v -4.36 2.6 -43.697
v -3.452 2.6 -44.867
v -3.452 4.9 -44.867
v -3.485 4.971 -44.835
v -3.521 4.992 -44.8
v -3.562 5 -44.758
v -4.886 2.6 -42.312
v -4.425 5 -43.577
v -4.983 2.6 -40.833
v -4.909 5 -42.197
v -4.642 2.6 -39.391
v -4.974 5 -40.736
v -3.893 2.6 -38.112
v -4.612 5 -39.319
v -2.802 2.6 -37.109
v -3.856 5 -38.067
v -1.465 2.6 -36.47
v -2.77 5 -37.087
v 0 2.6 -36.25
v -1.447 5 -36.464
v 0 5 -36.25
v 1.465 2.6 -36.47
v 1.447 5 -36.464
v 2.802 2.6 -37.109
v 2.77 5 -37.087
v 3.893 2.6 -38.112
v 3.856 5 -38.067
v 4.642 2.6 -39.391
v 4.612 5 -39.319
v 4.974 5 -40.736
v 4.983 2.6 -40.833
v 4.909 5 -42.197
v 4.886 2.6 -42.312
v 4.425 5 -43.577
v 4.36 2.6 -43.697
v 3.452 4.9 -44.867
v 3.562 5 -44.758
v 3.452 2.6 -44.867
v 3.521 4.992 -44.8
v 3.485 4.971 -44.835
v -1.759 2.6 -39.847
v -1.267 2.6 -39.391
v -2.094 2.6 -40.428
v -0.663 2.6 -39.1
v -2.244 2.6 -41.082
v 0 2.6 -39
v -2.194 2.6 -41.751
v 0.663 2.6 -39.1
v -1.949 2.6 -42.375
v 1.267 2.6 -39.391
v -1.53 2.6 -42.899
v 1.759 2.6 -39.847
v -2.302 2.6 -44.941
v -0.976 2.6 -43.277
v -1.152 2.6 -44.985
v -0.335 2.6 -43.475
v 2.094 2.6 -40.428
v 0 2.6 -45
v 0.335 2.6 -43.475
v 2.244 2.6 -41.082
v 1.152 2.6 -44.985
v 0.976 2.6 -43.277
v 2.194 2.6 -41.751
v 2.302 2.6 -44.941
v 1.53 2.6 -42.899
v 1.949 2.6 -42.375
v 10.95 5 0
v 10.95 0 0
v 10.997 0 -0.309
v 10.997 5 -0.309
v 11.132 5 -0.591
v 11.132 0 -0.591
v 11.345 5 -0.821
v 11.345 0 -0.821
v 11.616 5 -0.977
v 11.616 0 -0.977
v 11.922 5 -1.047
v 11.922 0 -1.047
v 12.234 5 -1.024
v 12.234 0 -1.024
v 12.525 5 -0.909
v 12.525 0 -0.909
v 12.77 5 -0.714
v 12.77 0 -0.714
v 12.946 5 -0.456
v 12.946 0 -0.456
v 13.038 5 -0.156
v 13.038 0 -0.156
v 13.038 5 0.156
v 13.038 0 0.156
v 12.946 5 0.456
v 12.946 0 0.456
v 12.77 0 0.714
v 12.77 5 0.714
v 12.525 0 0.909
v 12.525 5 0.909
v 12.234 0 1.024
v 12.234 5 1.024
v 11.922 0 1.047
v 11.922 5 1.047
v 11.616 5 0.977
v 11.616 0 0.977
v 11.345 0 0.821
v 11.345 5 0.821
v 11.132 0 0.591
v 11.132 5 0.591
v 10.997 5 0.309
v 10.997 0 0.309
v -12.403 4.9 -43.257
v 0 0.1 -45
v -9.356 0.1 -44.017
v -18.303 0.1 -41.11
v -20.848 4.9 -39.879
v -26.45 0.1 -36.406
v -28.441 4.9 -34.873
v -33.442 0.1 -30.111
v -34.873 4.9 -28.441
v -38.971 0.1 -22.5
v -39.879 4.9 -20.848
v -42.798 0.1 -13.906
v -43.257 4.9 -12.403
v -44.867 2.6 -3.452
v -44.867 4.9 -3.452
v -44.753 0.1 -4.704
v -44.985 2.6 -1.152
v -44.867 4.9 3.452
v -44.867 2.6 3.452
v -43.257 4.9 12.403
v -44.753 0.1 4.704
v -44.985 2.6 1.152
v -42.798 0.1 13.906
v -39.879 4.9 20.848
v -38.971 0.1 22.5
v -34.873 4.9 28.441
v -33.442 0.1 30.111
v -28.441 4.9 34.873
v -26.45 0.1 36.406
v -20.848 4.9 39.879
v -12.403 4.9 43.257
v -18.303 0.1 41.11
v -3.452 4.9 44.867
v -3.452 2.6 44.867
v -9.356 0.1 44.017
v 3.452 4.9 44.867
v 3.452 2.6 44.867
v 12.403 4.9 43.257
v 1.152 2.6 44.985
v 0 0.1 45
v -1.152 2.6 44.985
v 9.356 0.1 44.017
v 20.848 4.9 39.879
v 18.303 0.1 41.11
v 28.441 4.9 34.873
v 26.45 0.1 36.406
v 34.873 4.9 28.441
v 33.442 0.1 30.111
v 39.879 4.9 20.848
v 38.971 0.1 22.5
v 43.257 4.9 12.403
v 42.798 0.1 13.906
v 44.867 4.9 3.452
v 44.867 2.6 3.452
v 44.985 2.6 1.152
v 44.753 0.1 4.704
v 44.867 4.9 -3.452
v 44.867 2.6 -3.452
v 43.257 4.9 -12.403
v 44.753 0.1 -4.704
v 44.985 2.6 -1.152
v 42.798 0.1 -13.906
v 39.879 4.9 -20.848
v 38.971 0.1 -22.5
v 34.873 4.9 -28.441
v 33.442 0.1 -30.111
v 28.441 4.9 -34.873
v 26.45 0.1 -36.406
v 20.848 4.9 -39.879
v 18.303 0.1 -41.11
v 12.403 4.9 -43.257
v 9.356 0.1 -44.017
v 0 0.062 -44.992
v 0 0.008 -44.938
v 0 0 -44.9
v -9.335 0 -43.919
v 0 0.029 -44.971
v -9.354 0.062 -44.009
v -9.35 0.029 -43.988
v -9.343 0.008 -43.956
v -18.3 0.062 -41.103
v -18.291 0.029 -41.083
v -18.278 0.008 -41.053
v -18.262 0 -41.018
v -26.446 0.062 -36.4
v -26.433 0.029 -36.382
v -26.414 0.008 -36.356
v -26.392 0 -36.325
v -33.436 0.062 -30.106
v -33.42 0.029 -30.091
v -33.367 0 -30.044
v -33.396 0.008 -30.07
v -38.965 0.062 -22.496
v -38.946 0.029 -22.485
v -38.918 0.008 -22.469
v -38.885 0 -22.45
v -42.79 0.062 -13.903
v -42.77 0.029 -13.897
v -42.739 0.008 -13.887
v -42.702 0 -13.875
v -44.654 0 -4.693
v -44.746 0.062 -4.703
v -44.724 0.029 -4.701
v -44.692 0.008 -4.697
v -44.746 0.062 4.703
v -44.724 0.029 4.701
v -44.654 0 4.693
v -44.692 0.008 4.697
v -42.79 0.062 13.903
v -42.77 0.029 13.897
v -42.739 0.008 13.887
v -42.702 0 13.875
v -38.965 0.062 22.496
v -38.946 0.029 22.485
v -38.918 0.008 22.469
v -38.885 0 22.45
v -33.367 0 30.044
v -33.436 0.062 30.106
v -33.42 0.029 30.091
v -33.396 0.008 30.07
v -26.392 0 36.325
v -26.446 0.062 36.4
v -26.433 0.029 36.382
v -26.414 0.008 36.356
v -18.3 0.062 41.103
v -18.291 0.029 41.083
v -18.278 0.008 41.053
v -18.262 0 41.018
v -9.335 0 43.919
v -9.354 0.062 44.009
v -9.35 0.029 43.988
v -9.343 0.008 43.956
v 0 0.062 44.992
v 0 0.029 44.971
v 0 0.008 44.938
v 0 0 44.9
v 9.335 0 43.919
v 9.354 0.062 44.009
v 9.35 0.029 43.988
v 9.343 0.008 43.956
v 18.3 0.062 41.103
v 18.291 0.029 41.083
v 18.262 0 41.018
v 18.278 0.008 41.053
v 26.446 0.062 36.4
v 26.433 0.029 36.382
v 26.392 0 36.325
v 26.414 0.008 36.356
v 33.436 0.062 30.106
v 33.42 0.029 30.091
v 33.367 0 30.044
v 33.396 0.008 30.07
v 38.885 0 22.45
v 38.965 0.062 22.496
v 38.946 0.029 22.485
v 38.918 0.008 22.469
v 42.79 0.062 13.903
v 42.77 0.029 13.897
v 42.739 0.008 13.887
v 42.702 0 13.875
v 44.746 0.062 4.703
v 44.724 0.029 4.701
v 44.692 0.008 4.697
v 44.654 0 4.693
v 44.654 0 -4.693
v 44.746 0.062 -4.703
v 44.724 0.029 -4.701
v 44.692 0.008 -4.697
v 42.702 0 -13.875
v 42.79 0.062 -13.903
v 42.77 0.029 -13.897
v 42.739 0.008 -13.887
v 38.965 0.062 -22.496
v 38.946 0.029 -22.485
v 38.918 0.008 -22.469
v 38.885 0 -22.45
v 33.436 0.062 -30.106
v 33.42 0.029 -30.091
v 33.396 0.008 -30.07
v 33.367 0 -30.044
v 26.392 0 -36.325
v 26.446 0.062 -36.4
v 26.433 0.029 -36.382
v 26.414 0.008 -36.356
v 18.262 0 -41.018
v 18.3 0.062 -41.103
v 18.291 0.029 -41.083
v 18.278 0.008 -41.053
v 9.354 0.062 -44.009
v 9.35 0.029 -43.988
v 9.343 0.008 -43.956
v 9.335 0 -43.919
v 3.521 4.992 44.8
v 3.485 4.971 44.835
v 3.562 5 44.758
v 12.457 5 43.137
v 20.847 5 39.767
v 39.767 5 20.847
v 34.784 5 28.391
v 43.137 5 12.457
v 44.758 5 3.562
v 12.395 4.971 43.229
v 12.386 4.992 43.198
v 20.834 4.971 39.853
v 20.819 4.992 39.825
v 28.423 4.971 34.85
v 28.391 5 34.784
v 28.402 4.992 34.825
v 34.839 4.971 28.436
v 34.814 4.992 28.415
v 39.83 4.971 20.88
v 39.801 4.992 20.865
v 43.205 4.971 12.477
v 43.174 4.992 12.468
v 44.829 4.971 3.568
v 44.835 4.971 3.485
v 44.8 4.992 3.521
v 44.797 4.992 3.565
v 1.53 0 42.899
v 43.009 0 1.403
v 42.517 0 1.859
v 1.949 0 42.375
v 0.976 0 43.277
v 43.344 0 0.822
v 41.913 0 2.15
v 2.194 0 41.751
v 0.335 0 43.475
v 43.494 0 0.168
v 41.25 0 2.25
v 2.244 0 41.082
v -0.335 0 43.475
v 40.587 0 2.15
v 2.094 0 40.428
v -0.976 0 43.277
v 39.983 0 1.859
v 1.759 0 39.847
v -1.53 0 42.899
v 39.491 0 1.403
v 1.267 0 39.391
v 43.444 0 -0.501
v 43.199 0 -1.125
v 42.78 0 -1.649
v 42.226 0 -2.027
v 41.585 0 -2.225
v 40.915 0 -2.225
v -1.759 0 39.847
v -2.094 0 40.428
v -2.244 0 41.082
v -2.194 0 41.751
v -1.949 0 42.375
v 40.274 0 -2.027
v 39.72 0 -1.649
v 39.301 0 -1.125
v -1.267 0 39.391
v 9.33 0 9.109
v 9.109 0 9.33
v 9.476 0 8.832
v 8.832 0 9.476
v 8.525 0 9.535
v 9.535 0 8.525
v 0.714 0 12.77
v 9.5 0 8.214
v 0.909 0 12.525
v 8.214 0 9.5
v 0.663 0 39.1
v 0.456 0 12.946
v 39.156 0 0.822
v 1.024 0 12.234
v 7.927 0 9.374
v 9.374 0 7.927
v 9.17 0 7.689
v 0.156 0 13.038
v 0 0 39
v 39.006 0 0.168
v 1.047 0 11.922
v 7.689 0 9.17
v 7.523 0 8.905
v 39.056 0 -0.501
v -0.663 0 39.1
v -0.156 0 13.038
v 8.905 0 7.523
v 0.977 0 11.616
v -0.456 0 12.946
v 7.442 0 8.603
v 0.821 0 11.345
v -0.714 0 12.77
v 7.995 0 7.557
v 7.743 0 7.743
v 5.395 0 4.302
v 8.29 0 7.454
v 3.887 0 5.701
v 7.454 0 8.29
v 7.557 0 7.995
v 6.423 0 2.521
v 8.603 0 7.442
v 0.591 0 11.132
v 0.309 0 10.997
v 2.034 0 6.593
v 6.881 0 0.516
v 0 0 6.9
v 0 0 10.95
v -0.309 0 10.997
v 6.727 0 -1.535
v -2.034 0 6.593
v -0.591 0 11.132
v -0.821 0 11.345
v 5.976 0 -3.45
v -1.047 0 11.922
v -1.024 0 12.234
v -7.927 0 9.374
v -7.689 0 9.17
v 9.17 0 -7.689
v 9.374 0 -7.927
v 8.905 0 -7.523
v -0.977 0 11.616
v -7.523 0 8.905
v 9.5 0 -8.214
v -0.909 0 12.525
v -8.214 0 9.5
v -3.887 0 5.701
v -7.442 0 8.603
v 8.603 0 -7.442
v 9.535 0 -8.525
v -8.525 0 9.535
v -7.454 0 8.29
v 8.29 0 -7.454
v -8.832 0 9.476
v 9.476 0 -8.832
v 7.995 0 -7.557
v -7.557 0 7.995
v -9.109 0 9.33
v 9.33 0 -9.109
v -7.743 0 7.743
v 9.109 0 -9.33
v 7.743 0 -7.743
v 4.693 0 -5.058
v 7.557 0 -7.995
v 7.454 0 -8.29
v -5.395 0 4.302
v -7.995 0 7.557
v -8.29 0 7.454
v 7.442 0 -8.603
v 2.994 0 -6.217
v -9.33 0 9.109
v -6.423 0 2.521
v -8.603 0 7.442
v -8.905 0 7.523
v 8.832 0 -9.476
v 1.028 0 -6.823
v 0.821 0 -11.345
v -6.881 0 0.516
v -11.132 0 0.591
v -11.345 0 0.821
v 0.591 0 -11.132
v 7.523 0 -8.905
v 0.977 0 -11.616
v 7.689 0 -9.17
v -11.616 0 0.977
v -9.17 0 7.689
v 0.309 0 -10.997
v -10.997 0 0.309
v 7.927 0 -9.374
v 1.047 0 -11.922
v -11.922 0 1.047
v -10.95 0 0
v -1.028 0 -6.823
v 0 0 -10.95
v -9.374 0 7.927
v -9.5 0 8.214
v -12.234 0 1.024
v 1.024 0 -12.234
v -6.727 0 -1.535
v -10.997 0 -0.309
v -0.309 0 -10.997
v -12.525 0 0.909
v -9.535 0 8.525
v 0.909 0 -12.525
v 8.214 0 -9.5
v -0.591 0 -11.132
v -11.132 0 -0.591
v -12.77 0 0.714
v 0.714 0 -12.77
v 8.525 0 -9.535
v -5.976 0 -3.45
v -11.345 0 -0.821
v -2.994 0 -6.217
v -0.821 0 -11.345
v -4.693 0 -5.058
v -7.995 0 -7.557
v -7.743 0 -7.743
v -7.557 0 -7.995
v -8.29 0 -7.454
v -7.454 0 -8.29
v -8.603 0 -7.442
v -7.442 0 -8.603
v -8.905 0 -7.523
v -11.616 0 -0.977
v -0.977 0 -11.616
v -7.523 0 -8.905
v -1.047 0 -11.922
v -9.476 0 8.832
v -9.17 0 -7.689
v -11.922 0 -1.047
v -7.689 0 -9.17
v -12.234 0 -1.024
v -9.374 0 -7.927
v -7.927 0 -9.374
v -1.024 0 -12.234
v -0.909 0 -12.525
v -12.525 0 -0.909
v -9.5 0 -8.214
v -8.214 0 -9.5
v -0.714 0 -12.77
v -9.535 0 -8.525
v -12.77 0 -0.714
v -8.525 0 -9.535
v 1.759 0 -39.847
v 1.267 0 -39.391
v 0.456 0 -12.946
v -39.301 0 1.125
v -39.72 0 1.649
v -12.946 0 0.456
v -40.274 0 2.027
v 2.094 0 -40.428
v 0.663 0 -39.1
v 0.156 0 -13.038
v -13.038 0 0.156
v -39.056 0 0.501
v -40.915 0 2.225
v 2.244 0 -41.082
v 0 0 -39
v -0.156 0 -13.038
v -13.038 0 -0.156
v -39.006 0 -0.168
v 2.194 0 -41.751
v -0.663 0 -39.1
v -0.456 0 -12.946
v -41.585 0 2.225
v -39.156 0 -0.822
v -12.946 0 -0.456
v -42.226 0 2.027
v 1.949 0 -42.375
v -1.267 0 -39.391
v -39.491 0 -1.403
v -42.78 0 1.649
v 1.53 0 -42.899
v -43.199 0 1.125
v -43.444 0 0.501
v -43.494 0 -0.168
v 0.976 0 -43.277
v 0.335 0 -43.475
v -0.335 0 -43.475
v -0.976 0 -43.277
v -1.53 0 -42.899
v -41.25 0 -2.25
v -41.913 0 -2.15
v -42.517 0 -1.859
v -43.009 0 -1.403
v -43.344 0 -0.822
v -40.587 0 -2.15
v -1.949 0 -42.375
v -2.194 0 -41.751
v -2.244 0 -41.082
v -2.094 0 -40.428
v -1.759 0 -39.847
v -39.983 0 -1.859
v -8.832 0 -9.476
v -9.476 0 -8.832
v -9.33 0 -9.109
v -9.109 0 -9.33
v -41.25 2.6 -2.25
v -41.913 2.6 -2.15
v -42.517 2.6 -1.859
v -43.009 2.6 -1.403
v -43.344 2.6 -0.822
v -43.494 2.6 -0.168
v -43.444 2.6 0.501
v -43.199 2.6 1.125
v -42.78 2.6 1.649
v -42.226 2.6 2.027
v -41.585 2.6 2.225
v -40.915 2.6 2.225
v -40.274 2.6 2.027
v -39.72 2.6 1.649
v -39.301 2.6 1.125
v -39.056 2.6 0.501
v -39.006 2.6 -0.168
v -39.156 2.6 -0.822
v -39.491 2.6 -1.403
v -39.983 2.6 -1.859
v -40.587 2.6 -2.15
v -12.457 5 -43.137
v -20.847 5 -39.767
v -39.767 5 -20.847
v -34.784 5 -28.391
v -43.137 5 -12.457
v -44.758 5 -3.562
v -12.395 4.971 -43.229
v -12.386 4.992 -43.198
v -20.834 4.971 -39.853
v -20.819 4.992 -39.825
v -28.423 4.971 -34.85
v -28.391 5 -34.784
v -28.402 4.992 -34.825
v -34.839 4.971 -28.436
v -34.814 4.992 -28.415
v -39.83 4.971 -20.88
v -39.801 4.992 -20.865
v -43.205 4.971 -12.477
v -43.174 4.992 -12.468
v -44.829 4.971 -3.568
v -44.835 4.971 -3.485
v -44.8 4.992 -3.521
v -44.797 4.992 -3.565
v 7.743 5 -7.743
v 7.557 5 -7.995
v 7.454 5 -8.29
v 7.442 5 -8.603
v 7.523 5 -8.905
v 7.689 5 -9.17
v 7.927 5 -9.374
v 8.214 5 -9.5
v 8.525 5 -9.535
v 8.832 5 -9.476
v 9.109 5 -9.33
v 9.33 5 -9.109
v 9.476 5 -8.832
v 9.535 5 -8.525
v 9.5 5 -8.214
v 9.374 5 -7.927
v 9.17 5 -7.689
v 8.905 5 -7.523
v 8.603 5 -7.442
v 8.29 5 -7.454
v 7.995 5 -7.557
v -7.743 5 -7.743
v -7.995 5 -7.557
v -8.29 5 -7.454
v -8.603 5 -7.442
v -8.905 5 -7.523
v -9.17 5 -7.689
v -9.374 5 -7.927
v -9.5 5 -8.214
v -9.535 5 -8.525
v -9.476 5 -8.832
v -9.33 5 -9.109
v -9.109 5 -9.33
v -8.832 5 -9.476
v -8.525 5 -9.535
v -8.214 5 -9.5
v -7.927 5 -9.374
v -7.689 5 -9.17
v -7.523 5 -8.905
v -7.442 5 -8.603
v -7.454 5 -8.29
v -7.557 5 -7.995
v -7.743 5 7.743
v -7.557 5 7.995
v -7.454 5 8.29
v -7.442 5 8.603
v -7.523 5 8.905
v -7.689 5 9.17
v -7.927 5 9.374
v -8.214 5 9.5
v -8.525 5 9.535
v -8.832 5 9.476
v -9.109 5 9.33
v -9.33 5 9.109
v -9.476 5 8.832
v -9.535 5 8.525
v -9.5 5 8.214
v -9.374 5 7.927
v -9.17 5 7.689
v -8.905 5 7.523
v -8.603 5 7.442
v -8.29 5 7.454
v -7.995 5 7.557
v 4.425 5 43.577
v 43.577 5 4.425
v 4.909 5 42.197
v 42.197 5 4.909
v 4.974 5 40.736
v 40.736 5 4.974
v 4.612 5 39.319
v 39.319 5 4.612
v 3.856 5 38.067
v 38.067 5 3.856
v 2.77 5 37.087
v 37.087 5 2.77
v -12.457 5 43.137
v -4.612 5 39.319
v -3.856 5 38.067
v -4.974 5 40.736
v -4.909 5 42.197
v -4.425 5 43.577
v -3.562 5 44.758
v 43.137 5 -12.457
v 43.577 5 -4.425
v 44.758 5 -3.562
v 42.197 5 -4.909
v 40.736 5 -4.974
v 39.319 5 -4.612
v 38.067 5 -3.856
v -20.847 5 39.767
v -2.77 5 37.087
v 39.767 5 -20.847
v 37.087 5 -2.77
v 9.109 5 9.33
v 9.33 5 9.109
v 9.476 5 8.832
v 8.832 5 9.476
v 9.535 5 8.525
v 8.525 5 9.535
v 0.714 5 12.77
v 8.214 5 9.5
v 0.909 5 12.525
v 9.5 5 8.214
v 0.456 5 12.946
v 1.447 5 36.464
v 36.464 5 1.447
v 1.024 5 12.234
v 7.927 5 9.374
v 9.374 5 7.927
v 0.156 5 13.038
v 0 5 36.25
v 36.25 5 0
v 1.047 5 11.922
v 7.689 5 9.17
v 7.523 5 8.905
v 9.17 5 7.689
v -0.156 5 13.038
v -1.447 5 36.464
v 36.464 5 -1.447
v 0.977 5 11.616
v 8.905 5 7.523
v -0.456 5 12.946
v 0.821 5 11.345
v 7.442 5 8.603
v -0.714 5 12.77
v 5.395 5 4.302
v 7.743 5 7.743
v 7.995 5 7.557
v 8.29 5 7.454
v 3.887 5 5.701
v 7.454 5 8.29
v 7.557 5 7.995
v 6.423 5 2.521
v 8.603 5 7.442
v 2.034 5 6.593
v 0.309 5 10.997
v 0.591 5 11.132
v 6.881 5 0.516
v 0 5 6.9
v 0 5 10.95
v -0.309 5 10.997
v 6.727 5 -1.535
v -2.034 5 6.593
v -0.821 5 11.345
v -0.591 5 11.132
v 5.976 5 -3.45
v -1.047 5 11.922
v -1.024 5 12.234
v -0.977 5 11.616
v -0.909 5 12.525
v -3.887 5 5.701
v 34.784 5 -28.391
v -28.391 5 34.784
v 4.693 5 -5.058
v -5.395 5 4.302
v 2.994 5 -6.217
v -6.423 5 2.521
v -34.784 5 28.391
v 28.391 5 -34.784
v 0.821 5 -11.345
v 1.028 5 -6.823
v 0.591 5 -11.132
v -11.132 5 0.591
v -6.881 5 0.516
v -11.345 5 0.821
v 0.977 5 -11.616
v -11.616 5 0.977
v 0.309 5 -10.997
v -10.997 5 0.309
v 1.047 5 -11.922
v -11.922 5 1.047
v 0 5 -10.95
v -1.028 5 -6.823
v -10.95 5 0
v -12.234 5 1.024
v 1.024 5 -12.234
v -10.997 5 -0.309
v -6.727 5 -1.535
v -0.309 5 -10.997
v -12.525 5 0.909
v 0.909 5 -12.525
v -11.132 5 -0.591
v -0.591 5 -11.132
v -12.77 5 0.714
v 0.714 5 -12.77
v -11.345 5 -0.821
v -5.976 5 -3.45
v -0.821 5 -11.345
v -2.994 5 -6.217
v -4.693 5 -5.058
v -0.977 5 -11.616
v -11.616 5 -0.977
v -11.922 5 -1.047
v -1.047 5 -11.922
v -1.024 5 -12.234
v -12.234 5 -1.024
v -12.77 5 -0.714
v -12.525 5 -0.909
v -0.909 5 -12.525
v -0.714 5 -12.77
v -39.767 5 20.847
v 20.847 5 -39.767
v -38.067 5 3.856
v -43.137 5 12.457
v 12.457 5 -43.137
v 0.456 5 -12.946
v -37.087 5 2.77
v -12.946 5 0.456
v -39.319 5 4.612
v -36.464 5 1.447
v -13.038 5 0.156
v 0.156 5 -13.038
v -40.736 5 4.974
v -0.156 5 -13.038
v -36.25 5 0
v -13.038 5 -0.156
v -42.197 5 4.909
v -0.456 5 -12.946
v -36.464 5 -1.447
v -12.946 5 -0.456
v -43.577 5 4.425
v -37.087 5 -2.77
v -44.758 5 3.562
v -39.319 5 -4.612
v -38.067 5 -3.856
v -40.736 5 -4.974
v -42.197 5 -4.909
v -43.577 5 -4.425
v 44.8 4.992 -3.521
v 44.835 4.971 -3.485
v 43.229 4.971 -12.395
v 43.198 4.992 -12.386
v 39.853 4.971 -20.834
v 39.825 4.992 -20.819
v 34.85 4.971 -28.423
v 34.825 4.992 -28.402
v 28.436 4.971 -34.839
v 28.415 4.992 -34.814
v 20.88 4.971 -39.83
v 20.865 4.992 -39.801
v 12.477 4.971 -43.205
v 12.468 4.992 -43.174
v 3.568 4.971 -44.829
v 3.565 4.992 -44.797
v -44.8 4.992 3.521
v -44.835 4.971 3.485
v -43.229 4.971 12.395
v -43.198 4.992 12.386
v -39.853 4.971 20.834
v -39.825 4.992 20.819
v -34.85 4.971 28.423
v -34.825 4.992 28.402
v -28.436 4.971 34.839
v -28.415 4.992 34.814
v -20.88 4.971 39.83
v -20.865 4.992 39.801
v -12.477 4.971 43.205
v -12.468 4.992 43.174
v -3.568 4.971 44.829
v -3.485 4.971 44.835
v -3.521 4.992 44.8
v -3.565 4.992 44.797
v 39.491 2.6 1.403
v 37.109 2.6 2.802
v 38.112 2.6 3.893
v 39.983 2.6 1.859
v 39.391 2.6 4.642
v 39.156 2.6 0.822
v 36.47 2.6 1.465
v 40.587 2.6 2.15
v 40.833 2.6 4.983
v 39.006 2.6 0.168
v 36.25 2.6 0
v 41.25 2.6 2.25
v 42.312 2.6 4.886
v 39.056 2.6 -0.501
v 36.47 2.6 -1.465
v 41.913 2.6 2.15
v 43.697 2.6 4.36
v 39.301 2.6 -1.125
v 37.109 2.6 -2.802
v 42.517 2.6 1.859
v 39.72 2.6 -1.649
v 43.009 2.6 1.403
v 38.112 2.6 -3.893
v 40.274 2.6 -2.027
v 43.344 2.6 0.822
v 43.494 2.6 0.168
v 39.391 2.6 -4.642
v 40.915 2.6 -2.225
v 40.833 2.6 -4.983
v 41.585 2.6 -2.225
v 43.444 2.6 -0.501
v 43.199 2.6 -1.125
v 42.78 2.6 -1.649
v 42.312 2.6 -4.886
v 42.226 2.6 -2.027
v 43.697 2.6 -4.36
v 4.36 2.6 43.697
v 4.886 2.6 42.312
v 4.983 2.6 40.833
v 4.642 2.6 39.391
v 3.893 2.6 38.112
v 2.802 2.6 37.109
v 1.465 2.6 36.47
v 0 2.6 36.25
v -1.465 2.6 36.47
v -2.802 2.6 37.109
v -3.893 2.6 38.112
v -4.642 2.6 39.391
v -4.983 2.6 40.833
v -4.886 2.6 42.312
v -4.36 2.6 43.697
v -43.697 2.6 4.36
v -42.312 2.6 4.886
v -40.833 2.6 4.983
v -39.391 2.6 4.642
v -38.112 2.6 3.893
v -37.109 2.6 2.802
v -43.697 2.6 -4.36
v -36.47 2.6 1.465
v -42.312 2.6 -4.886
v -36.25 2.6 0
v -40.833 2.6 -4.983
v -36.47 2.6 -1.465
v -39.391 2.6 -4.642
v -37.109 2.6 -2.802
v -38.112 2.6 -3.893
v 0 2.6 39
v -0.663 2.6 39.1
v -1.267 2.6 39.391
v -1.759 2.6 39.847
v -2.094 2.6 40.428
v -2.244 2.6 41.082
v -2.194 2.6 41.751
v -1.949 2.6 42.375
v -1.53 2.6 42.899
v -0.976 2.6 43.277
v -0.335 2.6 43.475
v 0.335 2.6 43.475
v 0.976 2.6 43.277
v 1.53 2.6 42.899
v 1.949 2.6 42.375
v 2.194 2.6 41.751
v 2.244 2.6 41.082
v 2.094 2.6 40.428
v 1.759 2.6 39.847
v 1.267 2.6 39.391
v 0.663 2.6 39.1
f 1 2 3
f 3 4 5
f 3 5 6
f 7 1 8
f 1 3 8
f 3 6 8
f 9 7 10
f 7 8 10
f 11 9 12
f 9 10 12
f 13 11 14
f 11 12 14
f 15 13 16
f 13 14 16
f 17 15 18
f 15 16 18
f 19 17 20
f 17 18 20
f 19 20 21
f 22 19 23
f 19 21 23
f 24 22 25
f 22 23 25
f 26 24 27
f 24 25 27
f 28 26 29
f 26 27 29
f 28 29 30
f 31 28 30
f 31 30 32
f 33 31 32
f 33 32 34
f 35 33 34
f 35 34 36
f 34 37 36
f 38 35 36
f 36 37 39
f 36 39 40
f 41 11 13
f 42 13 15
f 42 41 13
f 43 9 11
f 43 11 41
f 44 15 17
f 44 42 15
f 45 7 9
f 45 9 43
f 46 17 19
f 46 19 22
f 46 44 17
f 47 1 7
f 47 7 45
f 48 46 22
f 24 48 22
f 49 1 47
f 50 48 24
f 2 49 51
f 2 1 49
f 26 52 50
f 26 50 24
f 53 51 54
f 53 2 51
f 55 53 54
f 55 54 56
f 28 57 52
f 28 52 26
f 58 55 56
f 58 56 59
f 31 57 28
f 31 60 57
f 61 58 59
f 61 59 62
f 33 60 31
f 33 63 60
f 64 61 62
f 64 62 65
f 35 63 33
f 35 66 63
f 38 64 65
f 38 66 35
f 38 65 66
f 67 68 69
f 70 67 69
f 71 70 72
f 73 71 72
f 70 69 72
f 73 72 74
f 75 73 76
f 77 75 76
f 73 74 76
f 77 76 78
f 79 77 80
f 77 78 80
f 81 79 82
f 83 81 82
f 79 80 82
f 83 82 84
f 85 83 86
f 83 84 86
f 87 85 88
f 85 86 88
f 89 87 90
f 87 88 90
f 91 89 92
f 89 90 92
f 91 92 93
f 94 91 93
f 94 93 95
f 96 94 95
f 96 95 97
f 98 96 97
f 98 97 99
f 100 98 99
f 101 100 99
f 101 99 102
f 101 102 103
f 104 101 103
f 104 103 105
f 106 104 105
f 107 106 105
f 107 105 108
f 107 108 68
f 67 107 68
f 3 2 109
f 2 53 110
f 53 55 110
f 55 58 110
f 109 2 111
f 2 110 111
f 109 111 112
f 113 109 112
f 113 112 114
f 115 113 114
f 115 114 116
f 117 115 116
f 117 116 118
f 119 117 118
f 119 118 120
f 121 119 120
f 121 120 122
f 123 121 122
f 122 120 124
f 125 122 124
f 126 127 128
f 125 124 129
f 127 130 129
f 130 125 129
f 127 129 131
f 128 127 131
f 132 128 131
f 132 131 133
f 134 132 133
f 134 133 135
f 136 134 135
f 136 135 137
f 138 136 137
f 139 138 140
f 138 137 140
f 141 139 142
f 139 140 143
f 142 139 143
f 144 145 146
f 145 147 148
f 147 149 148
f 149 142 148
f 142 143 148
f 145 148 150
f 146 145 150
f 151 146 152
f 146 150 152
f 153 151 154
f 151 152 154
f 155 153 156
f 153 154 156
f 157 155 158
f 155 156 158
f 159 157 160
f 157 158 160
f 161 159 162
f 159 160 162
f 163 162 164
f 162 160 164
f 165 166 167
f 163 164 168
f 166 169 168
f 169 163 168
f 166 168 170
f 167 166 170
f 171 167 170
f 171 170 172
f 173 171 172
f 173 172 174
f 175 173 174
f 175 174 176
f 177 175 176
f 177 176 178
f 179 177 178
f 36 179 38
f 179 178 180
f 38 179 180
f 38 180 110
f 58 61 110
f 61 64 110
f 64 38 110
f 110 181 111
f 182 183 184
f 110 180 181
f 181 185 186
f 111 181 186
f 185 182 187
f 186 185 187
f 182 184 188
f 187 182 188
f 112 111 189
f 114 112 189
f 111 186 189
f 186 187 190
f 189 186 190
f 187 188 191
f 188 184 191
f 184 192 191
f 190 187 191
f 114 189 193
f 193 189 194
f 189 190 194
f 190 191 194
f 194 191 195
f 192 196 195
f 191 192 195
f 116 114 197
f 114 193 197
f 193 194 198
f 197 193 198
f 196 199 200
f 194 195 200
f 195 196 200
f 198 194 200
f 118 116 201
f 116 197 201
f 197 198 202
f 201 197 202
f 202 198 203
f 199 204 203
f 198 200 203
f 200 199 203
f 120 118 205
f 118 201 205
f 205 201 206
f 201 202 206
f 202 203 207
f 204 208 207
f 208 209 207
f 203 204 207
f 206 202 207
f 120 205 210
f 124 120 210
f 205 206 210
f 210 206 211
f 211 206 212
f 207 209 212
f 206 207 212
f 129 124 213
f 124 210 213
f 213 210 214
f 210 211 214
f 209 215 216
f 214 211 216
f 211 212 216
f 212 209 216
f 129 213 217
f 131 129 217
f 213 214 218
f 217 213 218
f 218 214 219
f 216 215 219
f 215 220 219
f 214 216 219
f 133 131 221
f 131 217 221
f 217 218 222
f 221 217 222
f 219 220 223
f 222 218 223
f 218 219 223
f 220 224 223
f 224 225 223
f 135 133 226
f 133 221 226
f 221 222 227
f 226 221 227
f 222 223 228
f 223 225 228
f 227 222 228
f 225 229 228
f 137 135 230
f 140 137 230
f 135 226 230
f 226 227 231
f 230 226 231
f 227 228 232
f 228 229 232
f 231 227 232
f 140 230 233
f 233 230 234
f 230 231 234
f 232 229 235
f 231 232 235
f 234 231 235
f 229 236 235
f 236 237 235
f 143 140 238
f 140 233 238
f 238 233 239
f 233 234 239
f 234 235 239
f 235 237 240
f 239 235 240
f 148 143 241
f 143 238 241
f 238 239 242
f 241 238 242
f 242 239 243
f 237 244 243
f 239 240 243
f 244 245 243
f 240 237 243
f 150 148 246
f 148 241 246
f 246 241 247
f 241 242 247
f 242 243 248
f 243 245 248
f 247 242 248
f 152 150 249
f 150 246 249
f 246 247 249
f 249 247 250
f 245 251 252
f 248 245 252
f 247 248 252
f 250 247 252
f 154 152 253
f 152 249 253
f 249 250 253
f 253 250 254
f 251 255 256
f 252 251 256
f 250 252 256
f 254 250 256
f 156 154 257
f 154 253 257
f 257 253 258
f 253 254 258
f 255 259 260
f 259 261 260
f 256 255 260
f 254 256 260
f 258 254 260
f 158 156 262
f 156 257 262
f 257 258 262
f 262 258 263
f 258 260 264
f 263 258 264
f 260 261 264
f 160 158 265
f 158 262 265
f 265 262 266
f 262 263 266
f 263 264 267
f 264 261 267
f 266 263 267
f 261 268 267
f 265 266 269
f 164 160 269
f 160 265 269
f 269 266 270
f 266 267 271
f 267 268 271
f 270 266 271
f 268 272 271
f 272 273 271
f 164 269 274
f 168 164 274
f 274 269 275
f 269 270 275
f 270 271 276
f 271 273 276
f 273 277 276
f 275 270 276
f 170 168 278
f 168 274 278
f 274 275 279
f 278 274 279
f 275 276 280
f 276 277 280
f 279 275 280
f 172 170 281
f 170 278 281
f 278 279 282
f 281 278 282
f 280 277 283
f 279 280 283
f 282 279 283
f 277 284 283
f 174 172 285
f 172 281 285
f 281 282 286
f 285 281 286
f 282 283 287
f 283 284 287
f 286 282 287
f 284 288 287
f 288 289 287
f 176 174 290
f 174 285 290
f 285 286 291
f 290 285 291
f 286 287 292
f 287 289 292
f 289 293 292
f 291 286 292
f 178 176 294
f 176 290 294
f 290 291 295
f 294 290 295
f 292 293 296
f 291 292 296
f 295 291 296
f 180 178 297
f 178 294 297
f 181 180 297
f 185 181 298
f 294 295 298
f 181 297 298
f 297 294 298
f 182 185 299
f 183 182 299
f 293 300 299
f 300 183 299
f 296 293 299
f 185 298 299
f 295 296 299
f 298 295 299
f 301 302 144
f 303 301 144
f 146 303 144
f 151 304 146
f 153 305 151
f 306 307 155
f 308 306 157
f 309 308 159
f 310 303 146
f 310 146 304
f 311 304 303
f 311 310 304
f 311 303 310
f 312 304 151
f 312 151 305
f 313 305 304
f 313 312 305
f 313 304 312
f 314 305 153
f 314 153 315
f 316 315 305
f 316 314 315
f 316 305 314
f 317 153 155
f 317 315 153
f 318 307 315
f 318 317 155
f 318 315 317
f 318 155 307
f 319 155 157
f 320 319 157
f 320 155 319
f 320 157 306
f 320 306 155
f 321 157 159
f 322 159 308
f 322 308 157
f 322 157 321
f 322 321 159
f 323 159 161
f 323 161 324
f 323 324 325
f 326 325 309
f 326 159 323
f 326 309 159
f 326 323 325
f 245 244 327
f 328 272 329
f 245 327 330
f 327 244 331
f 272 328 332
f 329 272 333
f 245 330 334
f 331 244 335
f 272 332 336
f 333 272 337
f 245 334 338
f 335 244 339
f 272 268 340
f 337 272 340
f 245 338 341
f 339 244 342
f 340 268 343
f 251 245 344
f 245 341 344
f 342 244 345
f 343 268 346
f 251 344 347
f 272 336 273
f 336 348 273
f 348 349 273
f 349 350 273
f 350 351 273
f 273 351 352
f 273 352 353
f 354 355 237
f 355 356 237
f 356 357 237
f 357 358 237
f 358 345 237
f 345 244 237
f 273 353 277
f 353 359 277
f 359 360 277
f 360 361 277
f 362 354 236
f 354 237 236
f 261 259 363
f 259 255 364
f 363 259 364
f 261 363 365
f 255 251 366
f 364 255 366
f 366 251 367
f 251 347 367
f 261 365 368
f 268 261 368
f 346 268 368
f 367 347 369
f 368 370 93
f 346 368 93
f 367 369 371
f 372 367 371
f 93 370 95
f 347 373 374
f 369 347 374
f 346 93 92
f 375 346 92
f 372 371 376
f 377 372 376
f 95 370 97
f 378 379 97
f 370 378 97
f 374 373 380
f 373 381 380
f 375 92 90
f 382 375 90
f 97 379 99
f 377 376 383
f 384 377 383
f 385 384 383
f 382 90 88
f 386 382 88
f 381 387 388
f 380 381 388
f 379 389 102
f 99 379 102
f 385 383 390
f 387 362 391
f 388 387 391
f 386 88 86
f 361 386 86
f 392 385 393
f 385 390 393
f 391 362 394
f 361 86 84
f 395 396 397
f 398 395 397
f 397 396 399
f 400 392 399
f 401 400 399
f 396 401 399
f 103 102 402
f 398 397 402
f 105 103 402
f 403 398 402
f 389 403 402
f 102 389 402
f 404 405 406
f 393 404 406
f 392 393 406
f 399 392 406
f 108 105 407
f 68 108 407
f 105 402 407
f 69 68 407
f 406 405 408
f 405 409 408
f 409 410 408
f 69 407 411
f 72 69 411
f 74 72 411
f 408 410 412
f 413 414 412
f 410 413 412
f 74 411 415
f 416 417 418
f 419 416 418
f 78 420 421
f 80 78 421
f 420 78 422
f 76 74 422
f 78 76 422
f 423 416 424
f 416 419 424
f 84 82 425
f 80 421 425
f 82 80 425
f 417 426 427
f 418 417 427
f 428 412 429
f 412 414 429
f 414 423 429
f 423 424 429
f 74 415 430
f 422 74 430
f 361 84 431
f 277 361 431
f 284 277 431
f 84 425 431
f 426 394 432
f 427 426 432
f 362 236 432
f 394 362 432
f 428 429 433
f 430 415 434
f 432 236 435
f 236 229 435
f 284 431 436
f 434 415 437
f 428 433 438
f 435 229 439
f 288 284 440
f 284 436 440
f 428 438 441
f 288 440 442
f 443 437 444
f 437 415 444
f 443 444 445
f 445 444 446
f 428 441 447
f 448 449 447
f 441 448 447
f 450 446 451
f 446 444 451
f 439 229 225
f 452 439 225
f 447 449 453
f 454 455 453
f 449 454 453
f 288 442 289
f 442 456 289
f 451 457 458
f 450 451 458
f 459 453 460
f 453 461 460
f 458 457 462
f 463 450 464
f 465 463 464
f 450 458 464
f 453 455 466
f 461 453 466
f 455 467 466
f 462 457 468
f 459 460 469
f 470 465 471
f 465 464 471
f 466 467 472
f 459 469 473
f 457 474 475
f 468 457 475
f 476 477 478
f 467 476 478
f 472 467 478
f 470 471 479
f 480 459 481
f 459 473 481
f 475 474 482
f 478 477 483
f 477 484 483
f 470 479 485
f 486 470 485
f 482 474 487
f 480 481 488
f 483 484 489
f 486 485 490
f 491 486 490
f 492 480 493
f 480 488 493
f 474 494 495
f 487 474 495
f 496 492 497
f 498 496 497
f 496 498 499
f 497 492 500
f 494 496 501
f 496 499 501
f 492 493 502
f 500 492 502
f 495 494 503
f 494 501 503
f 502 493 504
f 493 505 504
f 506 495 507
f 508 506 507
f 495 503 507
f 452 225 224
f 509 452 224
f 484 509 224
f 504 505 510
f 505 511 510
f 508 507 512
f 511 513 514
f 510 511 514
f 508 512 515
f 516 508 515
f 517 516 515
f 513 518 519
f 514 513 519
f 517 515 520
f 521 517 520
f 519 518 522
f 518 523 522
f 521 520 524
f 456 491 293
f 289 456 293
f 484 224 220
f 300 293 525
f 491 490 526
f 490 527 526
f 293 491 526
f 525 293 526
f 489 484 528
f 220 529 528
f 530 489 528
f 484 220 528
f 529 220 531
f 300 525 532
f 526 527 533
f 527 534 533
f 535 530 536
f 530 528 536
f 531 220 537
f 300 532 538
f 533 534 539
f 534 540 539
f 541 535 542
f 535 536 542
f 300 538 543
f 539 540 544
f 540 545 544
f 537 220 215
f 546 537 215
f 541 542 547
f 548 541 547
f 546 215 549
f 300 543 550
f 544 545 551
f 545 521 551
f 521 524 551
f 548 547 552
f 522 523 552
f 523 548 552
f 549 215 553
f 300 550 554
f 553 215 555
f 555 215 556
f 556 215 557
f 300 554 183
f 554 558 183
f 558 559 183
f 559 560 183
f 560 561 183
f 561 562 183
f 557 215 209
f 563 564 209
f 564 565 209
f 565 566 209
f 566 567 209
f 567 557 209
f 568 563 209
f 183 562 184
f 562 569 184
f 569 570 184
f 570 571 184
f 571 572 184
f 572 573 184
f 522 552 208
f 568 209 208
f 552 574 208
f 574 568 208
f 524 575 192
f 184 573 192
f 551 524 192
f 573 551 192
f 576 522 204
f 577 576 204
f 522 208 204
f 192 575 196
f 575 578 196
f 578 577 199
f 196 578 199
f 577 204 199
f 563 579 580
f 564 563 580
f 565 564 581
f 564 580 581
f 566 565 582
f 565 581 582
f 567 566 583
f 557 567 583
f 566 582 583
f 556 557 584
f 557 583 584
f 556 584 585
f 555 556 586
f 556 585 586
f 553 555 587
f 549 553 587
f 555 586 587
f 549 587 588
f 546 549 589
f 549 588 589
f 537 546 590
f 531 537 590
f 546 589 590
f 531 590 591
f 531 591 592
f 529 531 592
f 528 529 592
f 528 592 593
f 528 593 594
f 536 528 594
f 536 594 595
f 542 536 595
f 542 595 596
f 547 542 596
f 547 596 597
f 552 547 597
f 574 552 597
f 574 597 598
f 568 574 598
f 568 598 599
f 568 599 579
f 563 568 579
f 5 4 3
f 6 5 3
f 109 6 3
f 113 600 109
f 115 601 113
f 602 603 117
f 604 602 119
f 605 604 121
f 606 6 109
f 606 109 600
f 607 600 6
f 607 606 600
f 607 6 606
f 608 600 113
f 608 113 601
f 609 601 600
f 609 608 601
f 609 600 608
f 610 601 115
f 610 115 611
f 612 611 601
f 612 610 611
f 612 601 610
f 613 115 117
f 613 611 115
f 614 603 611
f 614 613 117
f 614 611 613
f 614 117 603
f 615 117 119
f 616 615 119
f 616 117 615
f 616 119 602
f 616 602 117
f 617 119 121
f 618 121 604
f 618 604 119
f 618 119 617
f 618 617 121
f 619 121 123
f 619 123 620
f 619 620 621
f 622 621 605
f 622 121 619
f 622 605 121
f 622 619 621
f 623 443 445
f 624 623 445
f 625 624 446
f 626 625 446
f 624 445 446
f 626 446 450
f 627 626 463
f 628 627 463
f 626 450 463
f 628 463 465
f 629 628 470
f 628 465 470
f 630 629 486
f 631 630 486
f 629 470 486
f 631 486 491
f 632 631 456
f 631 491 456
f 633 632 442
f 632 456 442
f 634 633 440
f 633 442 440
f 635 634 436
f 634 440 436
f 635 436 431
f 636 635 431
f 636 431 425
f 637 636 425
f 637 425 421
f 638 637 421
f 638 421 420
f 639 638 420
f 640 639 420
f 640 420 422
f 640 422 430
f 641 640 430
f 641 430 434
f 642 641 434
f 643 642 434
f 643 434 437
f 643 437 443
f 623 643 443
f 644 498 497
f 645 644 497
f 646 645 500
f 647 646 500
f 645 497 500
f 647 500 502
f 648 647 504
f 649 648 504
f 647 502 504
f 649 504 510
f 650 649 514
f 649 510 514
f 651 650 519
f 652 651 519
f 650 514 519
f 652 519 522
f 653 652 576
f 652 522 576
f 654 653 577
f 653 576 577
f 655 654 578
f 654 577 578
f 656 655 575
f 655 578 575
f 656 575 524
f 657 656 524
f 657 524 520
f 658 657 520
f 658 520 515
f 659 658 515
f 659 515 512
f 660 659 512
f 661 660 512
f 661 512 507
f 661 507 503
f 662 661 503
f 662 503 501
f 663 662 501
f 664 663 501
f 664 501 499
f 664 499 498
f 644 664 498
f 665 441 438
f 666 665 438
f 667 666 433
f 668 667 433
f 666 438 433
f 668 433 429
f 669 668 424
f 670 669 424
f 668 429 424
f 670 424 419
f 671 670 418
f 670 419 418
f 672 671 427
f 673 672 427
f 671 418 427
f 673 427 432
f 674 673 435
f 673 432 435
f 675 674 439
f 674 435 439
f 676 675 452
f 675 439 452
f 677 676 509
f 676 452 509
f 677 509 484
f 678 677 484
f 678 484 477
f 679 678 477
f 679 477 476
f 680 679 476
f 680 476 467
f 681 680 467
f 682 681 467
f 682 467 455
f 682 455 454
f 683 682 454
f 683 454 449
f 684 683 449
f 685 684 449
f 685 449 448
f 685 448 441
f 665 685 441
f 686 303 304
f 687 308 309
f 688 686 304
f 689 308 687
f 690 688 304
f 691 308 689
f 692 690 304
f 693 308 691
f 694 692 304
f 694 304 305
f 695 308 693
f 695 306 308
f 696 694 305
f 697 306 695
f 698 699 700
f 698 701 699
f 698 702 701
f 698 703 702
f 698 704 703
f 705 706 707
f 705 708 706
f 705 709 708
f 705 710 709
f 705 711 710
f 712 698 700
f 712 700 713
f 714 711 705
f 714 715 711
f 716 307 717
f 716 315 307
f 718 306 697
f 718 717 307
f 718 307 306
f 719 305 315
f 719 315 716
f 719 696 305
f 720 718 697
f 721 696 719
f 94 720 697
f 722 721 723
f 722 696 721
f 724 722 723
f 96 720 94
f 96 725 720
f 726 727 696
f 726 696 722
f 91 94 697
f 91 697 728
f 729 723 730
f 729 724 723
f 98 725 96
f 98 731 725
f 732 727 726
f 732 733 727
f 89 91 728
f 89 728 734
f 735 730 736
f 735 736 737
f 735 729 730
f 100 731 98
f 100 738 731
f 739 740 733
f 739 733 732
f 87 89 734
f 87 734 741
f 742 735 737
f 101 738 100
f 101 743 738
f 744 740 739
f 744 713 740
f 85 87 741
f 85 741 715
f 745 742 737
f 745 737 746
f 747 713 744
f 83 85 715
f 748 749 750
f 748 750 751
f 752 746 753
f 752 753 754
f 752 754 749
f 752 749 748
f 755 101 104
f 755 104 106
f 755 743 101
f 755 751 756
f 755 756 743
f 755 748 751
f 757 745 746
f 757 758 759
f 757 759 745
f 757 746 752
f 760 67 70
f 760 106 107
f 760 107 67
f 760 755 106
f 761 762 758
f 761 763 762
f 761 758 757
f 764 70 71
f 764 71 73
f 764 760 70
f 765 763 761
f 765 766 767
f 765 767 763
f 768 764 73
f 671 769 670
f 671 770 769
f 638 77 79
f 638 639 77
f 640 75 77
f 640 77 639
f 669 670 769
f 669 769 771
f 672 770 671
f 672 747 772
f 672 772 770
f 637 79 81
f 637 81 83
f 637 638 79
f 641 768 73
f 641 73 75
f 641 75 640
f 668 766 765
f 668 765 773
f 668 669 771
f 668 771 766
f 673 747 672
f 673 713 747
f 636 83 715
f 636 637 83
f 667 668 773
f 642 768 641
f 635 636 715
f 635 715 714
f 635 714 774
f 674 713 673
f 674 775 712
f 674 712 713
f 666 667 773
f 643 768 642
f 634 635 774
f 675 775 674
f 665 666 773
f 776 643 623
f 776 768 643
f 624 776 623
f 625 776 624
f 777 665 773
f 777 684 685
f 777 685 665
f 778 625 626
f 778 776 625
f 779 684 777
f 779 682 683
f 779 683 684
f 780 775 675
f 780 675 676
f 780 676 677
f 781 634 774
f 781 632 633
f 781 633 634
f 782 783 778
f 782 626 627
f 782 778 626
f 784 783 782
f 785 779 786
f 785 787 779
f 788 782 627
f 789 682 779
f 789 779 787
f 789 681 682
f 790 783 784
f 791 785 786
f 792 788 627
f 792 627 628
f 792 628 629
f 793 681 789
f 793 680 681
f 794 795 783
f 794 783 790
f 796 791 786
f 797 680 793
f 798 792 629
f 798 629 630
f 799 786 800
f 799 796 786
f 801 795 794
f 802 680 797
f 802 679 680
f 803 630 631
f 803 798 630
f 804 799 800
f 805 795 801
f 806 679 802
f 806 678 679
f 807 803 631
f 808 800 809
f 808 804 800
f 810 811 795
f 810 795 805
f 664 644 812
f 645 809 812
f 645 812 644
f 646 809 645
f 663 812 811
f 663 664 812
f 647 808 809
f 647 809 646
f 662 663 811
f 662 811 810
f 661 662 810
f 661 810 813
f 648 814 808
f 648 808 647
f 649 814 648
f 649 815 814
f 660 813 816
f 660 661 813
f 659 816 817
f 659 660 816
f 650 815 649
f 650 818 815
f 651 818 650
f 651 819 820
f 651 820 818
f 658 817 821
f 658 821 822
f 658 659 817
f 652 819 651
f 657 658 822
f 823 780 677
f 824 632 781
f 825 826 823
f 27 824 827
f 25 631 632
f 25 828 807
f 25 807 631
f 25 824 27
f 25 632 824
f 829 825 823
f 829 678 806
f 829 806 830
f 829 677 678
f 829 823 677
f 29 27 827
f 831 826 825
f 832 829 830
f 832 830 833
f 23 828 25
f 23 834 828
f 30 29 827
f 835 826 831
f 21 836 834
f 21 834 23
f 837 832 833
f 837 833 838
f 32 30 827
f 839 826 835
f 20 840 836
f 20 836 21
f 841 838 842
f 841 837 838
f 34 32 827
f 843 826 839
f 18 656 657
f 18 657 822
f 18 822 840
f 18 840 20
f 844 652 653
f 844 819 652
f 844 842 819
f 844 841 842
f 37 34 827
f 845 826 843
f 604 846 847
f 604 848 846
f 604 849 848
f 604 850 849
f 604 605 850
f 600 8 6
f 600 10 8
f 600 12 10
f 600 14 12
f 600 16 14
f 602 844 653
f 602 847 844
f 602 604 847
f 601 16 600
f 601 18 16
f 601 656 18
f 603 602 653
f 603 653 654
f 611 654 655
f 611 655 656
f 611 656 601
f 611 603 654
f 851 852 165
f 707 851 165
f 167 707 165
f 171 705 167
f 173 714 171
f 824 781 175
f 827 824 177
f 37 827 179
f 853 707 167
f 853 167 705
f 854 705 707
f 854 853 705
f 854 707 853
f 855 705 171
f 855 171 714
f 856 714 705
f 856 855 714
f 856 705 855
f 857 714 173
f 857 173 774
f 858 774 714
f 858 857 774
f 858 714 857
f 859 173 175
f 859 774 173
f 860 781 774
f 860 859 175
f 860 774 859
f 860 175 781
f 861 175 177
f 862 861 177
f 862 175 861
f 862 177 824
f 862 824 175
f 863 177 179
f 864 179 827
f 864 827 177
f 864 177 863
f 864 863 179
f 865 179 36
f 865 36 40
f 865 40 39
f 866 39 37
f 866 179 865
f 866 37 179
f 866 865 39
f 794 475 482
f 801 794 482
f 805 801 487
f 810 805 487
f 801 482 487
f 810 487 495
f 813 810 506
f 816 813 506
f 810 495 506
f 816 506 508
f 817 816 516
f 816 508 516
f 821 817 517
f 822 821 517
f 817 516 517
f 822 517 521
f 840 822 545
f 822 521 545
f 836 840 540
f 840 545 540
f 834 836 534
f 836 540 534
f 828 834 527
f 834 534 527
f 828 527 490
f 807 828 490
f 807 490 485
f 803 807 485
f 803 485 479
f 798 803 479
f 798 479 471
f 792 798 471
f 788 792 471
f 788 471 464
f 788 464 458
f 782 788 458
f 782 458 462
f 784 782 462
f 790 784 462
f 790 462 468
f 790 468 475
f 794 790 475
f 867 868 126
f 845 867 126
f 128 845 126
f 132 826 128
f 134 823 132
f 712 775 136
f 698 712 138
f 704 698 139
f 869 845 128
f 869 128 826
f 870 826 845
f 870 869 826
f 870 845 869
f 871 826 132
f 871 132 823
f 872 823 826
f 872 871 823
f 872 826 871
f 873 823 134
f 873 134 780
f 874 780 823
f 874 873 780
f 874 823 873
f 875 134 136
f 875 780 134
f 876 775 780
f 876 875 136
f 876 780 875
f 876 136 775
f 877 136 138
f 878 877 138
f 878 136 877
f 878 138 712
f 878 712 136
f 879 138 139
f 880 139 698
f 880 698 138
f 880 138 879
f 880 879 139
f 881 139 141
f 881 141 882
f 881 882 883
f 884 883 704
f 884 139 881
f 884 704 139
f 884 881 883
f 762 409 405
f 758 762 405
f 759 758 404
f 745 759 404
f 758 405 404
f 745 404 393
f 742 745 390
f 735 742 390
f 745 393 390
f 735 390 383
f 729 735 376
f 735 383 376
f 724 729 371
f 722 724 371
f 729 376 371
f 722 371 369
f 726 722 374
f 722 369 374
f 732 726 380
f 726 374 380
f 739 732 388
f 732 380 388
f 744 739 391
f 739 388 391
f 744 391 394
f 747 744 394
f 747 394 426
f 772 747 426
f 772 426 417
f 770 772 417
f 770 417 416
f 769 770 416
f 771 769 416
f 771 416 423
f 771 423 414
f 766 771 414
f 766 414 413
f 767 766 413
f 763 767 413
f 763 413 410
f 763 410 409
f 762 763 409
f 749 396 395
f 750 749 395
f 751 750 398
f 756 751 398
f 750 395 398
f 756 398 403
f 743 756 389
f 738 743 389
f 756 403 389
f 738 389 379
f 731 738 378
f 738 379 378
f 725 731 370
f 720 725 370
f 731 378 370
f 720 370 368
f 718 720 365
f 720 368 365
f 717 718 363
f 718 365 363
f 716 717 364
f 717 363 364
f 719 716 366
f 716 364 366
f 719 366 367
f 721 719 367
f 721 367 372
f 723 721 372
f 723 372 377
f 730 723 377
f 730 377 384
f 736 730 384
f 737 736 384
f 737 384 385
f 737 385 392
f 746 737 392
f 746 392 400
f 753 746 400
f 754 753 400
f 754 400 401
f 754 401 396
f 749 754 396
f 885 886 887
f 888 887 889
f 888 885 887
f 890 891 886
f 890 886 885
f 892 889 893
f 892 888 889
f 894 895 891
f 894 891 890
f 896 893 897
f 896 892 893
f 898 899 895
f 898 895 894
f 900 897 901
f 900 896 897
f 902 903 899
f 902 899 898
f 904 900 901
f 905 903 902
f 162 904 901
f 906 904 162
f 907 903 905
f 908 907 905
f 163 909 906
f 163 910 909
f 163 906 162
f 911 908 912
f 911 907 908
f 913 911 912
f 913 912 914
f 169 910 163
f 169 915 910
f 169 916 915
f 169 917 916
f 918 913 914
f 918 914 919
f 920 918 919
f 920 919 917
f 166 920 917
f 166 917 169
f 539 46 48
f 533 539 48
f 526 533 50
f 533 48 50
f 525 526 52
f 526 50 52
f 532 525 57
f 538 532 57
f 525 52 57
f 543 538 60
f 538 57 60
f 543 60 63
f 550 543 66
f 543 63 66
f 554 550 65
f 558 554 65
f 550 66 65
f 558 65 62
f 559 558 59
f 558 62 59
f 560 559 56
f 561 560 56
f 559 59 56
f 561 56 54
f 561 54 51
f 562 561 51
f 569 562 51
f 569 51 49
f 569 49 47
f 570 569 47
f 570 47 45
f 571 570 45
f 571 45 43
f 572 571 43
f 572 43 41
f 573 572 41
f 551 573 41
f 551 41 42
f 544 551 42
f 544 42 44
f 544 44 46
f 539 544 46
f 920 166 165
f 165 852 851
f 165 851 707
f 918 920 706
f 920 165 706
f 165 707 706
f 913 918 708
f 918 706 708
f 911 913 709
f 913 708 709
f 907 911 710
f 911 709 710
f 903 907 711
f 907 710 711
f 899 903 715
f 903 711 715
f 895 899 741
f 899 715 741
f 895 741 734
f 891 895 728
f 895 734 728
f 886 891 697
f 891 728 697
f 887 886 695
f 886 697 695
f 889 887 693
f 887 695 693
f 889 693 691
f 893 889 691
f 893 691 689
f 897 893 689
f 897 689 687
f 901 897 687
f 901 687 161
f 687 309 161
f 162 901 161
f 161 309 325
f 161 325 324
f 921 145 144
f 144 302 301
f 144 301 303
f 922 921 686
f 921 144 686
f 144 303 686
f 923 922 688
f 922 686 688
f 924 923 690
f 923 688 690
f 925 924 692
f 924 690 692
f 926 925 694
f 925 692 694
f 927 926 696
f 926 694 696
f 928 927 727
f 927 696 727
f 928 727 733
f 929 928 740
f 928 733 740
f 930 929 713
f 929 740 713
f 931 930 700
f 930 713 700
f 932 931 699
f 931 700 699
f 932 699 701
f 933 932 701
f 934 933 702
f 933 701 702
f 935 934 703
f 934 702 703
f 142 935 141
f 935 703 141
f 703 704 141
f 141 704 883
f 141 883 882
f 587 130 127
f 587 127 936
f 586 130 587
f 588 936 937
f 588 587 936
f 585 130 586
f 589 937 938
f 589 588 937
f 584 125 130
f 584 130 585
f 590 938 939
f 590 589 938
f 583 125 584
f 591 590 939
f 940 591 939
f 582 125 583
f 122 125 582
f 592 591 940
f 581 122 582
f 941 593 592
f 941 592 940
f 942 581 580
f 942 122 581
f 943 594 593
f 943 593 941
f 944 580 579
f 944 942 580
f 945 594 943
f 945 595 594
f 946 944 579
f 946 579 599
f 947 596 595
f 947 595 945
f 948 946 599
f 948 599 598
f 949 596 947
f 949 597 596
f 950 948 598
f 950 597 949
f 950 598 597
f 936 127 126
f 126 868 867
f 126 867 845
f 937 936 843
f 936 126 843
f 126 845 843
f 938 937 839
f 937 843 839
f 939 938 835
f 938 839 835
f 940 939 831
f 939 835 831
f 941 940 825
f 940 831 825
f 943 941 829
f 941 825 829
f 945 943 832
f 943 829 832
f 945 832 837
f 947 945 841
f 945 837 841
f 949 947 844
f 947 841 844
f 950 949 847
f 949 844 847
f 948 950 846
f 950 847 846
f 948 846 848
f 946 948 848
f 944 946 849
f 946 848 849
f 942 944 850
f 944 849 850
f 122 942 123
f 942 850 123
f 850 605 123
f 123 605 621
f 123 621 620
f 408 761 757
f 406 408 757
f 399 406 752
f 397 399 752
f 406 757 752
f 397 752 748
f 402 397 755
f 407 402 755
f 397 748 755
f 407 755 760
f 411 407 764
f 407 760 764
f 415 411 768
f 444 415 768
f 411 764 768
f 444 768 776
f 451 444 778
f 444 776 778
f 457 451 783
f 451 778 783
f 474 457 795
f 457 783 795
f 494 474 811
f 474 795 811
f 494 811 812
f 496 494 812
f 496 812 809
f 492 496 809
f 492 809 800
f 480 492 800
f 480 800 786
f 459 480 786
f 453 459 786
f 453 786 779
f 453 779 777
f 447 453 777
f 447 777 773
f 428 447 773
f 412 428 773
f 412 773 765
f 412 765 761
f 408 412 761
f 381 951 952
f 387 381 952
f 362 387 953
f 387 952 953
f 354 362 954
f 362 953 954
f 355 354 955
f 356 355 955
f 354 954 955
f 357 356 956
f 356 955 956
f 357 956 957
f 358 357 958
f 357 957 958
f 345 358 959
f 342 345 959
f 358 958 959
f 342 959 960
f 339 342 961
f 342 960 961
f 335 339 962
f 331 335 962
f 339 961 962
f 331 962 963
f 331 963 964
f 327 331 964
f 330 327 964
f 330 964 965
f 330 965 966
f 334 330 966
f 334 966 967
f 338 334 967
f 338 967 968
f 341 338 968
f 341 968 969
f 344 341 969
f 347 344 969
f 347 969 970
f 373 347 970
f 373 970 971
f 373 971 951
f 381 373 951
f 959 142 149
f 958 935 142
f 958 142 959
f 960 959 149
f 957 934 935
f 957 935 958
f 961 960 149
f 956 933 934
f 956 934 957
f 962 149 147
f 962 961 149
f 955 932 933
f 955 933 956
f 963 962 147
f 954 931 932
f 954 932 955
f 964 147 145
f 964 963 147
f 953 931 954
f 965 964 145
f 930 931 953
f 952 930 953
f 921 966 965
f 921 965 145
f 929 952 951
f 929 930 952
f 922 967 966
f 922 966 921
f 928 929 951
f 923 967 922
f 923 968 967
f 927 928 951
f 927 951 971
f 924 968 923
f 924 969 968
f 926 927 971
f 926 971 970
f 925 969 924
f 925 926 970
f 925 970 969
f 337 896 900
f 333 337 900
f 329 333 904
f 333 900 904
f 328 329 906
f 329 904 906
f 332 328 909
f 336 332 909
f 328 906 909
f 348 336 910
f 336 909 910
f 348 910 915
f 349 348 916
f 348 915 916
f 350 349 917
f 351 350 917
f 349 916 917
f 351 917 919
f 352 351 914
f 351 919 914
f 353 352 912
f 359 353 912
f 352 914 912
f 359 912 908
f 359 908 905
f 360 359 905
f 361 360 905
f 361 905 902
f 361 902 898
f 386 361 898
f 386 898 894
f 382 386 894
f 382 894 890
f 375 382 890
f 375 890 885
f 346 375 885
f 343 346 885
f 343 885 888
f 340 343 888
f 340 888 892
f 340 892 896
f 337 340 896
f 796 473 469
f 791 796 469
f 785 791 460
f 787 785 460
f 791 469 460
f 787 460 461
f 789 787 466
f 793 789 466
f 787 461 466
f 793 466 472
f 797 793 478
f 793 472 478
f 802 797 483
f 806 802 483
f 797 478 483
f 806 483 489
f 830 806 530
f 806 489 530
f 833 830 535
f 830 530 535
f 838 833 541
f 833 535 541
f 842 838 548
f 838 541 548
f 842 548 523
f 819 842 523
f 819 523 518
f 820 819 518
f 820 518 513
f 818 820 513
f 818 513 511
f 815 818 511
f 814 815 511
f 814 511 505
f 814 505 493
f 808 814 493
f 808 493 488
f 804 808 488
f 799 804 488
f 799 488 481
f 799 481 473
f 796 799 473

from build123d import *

# Parameters (mm, degrees)
ESQUISSE2_R             = 45
ESQUISSE2_R_2           = 1.55
BOSS_EXTRU_1_DEPTH      = 6.5
ENL_V_START             = -1.5
ESQUISSE3_R             = 45
ESQUISSE3_R_2           = 6
ENL_V_MAT_EXTRU_1_DEPTH = 1.5
CONG_1_R                = 0.1
ESQUISSE5_R             = 4
ENL_V_MAT_EXTRU_3_DEPTH = 5.5
SKETCH1_R               = 2.25
CUT_EXTRUDE1_DEPTH      = 64.835726815
SKETCH2_R               = 1.05
CUT_EXTRUDE2_DEPTH      = 64.970696557
CIRPATTERN1_COUNT       = 8
SKETCH6_R               = 6.9
CUT_EXTRUDE3_DEPTH      = 10
SKETCH7_R               = 5
CUT_EXTRUDE4_DEPTH      = 2.4


with BuildPart() as part:
    # Esquisse2 → Boss.-Extru.1 (new body)
    with BuildSketch(Plane(origin=(0, 0, 0), x_dir=(1, 0, 0), z_dir=(0, 1, 0))):
        with Locations(Location((0, 0, 0), (0, 0, 90))):
            Circle(ESQUISSE2_R)
        with Locations(Location((0, 0, 0), (0, 0, 90))):
            Circle(ESQUISSE2_R_2, mode=Mode.SUBTRACT)
    extrude(amount=BOSS_EXTRU_1_DEPTH)

    # Esquisse3 → Enlèv. mat.-Extru.1 (cut)
    with BuildSketch(Plane(origin=(0, 6.5, 0), x_dir=(1, 0, 0), z_dir=(0, 1, 0)).offset(ENL_V_START)):
        with Locations(Location((0, 0, 0), (0, 0, 90))):
            Circle(ESQUISSE3_R)
        with Locations(Location((0, 0, 0), (0, 0, 270))):
            Circle(ESQUISSE3_R_2, mode=Mode.SUBTRACT)
    extrude(amount=ENL_V_MAT_EXTRU_1_DEPTH, mode=Mode.SUBTRACT)

    # Congé1
    cong_1_edges = [part.edges().sort_by_distance(p)[0] for p in [
        (0, 5, 45),
        (0, 5, -6),
        (0, 6.5, -6),
        (0, 0, 45),
        (0, 6.5, 1.55),
    ]]
    fillet(cong_1_edges, radius=CONG_1_R)

    # Esquisse5 → Enlèv. mat.-Extru.3 (cut)
    with BuildSketch(Plane.XZ):
        with Locations(Location((0, 0, 0), (0, 0, 270))):
            Circle(ESQUISSE5_R)
    extrude(amount=-ENL_V_MAT_EXTRU_3_DEPTH, mode=Mode.SUBTRACT)

    # Sketch1 → Cut-Extrude1 (cut, through all)
    with BuildSketch(Plane(origin=(0, 5, 0), x_dir=(1, 0, 0), z_dir=(0, 1, 0))):
        with Locations(Location((0, 41.25, 0), (0, 0, 270))):
            Circle(SKETCH1_R)
        with Locations(Location((41.25, 0, 0), (0, 0, 270))):
            Circle(SKETCH1_R)
        with Locations(Location((0, -41.25, 0), (0, 0, 90))):
            Circle(SKETCH1_R)
        with Locations(Location((-41.25, 0, 0), (0, 0, 90))):
            Circle(SKETCH1_R)
    extrude(amount=-CUT_EXTRUDE1_DEPTH, mode=Mode.SUBTRACT)

    # Sketch2 → Cut-Extrude2 (cut, through all)
    with BuildSketch(Plane.XZ):
        with Locations(Location((0, 12, 0), (0, 0, 270))):
            Circle(SKETCH2_R)
    cut_extrude2 = extrude(amount=-CUT_EXTRUDE2_DEPTH, mode=Mode.SUBTRACT)

    # CirPattern1: Cut-Extrude2 ×8 about axis
    cirpattern1_axis = Axis((0, 0, 0), (0, 1, 0))
    for i in range(1, CIRPATTERN1_COUNT):
        add(cut_extrude2.rotate(cirpattern1_axis, i * 360 / CIRPATTERN1_COUNT), mode=Mode.SUBTRACT)

    # Sketch6 → Cut-Extrude3 (cut)
    with BuildSketch(Plane(origin=(0, 6.5, 0), x_dir=(1, 0, 0), z_dir=(0, 1, 0))):
        with Locations(Location((0, 0, 0), (0, 0, 270))):
            Circle(SKETCH6_R)
    extrude(amount=-CUT_EXTRUDE3_DEPTH, mode=Mode.SUBTRACT)

    # Sketch7 → Cut-Extrude4 (cut)
    with BuildSketch(Plane(origin=(0, 5, 0), x_dir=(1, 0, 0), z_dir=(0, 1, 0))):
        with Locations((-41.25, 0)):
            Circle(SKETCH7_R)
        with Locations((0, 41.25)):
            Circle(SKETCH7_R)
        with Locations((41.25, 0)):
            Circle(SKETCH7_R)
        with Locations((0, -41.25)):
            Circle(SKETCH7_R)
    extrude(amount=-CUT_EXTRUDE4_DEPTH, mode=Mode.SUBTRACT)


solid = part.part
